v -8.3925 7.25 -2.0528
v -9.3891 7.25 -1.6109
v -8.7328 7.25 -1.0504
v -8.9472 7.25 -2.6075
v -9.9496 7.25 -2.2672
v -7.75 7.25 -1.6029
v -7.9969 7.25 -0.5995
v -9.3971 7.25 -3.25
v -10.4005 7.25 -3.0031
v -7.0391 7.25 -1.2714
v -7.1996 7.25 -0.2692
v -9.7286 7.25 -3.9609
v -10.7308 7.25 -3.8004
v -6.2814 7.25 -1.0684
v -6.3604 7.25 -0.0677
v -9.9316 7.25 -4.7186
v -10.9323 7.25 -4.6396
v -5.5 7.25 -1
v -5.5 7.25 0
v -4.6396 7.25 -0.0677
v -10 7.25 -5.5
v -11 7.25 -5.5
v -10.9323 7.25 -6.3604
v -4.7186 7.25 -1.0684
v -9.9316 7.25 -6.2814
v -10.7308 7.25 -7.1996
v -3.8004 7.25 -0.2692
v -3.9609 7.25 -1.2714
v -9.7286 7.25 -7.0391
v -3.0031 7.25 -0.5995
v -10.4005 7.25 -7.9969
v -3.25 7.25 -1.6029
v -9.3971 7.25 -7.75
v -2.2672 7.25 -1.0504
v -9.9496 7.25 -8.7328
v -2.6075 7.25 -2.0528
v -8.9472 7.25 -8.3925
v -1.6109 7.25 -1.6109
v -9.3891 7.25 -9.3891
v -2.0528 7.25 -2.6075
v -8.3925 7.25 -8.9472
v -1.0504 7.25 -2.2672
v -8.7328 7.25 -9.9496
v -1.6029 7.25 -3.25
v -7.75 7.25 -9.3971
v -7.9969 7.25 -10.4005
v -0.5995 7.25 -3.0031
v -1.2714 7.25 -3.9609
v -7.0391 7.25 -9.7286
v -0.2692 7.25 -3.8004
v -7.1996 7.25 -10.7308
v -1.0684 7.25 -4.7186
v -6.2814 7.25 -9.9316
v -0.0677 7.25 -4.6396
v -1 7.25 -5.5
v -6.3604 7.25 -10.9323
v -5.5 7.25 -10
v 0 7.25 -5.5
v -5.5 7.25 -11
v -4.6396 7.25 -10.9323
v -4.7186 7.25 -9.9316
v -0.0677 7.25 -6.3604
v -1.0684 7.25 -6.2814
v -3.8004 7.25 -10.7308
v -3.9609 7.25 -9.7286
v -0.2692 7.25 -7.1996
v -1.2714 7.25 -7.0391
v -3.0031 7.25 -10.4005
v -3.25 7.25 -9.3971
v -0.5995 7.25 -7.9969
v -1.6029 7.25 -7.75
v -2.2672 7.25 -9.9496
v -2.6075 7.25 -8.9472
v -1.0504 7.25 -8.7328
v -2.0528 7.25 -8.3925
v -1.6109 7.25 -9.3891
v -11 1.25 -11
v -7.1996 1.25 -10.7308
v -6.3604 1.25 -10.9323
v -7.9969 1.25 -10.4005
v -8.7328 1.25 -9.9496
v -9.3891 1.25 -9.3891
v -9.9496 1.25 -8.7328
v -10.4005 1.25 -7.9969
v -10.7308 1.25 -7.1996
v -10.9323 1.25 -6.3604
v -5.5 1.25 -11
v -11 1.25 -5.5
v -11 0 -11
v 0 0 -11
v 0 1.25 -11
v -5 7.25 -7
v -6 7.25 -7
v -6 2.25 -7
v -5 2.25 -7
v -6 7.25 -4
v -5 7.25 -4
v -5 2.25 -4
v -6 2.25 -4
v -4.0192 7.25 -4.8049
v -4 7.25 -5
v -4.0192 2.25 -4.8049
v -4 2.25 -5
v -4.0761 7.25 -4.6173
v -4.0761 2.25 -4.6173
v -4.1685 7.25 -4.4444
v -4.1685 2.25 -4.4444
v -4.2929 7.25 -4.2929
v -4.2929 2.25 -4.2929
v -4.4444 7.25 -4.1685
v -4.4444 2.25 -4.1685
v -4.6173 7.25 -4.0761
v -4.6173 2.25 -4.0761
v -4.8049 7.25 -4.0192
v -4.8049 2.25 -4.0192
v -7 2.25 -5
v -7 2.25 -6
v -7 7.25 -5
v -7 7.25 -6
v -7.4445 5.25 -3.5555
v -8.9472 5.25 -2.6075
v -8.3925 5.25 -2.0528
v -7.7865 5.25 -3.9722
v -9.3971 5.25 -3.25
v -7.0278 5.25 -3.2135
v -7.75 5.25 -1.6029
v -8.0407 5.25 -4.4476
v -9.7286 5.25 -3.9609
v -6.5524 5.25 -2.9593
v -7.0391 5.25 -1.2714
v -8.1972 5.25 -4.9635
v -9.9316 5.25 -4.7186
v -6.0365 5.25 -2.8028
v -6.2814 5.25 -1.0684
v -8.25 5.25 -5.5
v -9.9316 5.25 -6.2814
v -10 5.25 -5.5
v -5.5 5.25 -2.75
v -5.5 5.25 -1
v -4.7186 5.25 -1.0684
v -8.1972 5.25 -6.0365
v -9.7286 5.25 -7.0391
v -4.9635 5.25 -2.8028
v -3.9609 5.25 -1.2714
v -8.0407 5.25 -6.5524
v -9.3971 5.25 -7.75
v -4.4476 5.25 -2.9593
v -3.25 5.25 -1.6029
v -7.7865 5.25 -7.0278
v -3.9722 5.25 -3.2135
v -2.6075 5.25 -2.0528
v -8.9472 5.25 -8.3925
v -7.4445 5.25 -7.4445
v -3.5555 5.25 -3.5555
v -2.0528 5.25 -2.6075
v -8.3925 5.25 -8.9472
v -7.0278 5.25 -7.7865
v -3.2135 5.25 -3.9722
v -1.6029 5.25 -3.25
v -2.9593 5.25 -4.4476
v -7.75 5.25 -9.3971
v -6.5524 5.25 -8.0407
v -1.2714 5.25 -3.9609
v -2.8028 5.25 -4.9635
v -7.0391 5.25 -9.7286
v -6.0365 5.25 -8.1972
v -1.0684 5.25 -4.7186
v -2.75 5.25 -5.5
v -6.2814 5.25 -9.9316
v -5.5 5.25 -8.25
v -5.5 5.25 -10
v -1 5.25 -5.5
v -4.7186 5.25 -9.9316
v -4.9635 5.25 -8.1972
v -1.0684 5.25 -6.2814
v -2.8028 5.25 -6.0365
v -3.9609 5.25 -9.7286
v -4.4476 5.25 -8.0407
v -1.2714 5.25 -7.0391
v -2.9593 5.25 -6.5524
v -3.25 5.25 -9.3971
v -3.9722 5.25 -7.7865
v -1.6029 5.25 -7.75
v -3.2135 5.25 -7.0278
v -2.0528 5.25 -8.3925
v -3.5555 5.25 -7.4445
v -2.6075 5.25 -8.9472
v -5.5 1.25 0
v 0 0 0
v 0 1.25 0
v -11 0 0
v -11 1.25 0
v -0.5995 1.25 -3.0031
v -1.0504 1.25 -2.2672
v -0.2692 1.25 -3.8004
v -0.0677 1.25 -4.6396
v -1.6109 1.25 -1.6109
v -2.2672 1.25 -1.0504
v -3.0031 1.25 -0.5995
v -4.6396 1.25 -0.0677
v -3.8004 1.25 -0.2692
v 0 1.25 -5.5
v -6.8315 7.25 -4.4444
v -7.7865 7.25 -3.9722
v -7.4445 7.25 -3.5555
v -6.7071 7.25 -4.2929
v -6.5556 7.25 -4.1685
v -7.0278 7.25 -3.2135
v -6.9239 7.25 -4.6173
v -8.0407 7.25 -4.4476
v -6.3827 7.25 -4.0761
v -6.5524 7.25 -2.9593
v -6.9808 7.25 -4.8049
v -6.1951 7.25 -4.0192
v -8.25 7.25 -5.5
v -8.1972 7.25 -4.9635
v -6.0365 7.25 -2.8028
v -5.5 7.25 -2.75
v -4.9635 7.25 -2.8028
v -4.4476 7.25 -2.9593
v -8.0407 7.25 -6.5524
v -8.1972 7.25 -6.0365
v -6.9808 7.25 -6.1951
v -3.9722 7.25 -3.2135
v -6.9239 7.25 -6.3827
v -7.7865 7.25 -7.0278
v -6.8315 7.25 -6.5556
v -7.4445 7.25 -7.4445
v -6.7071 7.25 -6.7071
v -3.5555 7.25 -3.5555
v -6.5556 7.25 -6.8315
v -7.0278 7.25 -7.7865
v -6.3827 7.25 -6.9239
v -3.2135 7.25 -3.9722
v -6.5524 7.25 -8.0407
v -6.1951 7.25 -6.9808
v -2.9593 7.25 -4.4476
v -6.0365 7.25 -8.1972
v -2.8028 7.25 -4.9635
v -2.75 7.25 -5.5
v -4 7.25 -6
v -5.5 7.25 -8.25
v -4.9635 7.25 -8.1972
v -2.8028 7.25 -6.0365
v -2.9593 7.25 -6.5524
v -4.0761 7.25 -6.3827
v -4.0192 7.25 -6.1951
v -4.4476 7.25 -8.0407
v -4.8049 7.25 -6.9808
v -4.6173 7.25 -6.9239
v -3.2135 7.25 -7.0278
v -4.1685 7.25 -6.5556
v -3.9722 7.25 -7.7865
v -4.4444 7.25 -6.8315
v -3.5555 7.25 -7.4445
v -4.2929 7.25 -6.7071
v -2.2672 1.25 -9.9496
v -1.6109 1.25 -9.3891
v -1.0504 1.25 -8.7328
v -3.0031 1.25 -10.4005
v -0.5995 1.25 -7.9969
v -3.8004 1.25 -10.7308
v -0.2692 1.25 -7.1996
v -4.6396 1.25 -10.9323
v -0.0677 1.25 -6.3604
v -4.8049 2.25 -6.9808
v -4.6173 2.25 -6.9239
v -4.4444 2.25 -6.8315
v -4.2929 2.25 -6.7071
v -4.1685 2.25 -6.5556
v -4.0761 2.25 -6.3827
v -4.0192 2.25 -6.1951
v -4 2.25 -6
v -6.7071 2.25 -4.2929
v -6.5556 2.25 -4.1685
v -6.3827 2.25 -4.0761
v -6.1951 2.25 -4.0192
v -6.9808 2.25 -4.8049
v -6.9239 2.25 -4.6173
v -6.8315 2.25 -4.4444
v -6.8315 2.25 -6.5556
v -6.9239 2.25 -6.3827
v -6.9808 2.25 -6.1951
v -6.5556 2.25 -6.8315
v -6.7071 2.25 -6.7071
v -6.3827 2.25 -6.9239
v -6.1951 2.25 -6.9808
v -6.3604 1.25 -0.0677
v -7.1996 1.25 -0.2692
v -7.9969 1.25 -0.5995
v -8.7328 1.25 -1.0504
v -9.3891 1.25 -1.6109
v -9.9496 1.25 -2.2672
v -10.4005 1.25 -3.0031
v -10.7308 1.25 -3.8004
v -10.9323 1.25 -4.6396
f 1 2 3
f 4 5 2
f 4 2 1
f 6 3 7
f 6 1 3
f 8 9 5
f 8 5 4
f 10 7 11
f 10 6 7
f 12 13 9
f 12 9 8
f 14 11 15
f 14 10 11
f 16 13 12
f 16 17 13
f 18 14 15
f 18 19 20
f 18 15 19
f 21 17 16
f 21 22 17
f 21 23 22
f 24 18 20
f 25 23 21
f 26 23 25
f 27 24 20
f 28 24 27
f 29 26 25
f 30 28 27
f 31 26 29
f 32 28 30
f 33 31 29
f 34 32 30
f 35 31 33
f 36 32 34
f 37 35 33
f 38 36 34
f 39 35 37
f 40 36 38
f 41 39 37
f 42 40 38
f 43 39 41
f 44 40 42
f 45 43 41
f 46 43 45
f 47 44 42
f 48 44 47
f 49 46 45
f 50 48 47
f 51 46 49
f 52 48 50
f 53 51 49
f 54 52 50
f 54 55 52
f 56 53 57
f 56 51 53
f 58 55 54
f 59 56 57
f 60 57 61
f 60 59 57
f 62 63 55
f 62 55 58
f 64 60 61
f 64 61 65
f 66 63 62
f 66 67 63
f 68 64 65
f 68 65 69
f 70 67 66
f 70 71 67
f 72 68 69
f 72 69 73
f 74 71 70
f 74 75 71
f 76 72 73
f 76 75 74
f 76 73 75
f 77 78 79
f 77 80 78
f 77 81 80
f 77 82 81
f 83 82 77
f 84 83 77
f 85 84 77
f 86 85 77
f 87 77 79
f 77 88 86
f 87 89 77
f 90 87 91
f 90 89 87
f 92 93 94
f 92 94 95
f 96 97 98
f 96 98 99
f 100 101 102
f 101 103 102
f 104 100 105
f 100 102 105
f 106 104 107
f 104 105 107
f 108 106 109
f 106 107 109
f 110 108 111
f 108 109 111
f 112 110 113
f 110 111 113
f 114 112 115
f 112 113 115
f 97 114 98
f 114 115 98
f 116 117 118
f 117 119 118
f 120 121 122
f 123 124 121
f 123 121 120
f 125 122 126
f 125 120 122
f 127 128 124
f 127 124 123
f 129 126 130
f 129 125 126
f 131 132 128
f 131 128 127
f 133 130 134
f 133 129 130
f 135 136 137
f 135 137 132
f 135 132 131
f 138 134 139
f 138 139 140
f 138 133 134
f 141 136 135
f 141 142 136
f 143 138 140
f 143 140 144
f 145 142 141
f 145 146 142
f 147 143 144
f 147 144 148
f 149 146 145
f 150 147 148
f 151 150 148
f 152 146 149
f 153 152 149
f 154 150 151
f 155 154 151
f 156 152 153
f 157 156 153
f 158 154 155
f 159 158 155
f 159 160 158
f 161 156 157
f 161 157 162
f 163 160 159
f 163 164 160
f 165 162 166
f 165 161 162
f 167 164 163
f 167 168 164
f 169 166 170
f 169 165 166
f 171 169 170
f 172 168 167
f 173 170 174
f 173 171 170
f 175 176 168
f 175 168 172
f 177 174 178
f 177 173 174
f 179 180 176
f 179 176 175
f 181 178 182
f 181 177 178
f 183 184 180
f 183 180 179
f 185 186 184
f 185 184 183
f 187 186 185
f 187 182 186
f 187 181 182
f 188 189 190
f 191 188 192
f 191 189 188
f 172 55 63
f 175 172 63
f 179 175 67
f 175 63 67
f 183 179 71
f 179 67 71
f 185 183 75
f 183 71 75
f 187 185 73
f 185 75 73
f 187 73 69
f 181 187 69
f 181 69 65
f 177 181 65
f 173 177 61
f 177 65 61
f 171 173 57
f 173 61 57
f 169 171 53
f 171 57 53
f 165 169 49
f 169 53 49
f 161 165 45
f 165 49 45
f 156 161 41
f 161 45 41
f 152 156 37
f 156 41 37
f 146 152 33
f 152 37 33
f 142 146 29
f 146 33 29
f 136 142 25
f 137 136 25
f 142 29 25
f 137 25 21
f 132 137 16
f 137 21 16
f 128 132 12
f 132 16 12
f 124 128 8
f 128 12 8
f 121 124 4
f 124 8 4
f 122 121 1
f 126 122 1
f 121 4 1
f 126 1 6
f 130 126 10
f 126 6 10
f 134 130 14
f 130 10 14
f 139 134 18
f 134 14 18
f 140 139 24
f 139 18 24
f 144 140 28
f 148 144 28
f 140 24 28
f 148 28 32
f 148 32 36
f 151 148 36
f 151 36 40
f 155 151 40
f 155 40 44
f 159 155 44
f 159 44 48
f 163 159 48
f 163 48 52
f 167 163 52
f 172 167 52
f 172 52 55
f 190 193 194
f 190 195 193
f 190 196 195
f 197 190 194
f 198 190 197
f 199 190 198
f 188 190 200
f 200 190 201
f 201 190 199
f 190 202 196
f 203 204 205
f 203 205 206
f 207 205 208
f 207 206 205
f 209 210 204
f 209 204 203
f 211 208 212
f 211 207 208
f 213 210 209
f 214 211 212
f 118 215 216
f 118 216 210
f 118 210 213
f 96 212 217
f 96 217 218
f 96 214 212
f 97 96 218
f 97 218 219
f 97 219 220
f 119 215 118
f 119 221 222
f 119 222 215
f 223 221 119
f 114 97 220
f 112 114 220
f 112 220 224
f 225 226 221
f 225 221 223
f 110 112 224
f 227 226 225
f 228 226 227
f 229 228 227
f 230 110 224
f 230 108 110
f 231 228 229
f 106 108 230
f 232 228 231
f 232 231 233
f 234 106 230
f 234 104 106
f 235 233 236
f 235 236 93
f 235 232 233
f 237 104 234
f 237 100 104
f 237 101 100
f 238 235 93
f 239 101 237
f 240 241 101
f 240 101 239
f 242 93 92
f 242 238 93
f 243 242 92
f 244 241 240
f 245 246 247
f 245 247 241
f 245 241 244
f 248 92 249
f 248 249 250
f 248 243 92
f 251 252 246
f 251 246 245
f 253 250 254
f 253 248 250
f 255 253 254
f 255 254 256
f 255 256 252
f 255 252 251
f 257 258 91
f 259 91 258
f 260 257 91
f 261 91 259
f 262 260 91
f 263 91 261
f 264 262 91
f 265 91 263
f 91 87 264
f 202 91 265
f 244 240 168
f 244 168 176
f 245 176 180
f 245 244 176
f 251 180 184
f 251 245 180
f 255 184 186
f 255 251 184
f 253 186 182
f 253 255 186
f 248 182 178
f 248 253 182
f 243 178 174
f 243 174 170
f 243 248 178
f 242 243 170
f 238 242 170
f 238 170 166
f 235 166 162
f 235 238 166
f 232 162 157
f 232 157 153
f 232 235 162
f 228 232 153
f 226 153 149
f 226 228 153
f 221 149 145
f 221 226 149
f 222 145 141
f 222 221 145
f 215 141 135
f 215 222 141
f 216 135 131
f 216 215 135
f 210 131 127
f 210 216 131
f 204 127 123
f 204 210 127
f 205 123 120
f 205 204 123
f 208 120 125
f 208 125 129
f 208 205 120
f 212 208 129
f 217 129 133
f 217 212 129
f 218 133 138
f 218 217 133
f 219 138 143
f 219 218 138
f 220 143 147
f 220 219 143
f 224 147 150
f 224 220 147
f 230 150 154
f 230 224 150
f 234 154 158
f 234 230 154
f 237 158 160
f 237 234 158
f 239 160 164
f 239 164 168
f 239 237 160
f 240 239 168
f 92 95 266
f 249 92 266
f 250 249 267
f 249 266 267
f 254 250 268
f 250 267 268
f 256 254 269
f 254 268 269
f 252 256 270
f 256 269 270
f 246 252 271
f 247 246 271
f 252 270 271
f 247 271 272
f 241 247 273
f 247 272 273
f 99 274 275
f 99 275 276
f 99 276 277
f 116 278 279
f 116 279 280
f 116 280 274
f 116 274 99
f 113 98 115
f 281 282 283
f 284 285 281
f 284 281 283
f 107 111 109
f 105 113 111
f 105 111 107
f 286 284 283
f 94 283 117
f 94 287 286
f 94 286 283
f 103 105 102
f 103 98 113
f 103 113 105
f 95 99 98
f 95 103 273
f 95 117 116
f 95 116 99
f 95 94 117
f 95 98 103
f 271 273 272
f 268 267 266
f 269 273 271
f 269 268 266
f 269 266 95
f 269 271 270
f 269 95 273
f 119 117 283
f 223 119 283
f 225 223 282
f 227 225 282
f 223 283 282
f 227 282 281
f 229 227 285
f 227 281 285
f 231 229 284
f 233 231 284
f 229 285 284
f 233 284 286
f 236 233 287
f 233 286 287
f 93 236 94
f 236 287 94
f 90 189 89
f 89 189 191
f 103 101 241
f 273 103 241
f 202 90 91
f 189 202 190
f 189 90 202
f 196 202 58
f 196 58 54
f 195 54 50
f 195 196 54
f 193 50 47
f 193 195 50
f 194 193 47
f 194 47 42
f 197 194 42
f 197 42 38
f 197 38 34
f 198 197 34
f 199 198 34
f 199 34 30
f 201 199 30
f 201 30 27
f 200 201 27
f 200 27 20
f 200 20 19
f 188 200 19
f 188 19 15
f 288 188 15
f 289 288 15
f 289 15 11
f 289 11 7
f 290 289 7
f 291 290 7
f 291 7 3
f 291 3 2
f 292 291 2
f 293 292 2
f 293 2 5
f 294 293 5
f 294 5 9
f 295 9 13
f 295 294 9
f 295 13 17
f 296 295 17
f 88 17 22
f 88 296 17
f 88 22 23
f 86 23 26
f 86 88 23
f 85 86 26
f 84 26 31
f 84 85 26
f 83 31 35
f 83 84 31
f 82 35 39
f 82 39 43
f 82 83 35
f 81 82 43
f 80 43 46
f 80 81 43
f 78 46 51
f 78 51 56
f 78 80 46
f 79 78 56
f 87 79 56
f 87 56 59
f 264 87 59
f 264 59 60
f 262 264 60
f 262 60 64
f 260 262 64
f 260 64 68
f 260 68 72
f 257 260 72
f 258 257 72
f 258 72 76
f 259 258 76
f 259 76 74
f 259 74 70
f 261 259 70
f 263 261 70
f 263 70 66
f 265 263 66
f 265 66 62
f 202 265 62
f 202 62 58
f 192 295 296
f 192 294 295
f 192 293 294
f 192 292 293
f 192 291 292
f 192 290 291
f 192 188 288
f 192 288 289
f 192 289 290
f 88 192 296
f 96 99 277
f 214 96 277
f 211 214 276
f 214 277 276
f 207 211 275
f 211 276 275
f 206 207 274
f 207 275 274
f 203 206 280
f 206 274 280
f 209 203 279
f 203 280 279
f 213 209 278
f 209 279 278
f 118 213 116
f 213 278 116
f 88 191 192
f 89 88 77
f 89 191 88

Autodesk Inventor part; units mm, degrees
ref_plane "YZ Plane" through (0, 0, 0) normal (1, 0, 0) x (0, 1, 0)
ref_plane "XZ Plane" through (0, 0, 0) normal (0, 1, 0) x (-1, 0, 0)
ref_plane "XY Plane" through (0, 0, 0) normal (0, 0, 1) x (1, 0, 0)
sketch "Boceto1" plane through (0, 0, 0) normal (0, 1, 0) x (-1, 0, 0)
  line L0 (0, 0) -> (11, 0)
  line L1 (11, 0) -> (11, -11)
  line L2 (11, -11) -> (0, -11)
  line L3 (0, -11) -> (0, 0)
  dimension "d0" = 11
  dimension "d1" = 11
extrude "Extrusión1" add sketch "Boceto1" along normal blind 1.25
sketch "Boceto2" plane through (0, 1.25, 0) normal (0, 1, 0) x (1, 0, 0)
  line L0 (-11, 0) -> (0, 0) projected
  line L1 (-11, 11) -> (-11, 0) projected
  line L2 (0, 0) -> (-11, 11)
  line L3 (0, 0) -> (0, 11) projected
  line L4 (0, 11) -> (-11, 0)
  circle A0 centre (-5.5, 5.5) radius 5.5
  dimension "d4" = 11
extrude "Extrusión2" add sketch "Boceto2" along normal blind 6 contours A0 L4 L2 | A0 L2 L4 | L2 L4 A0 | A0 L4 L2
sketch "Boceto4" plane through (-5.5, 7.25, -5.5) normal (0, 1, 0) x (1, 0, 0)
  line L0 (0, 0) -> (-3, 0)
  line L1 (-3, 0) -> (-3, 1.5)
  line L2 (-3, 1.5) -> (-3, -1.5)
  line L3 (-3, -1.5) -> (-1.5, -1.5)
  line L4 (-1.5, -1.5) -> (-1.5, -3)
  line L5 (-1.5, -3) -> (1.5, -3)
  line L6 (1.5, -3) -> (1.5, -1.5)
  line L7 (1.5, -1.5) -> (3, -1.5)
  line L8 (3, -1.5) -> (3, 1.5)
  line L9 (3, 1.5) -> (1.5, 1.5)
  line L10 (1.5, 1.5) -> (1.5, 3)
  line L11 (1.5, 3) -> (-1.5, 3)
  line L12 (-1.5, 3) -> (-1.5, 1.5)
  line L13 (-3, 1.5) -> (-1.5, 1.5)
  line L14 (-1.5, 1.5) -> (-1.5, -1.5)
  line L15 (1.5, -1.5) -> (1.5, 1.5)
  line L16 (-1.5, 1.5) -> (1.5, 1.5)
  line L17 (1.5, -1.5) -> (-1.5, -1.5)
  point P0 (5.5, -5.5)
  dimension "d7" = 3
  dimension "d8" = 1.5
  dimension "d9" = 3
  dimension "d10" = 1.5
  dimension "d11" = 1.5
  dimension "d12" = 3
  dimension "d13" = 1.5
  dimension "d14" = 1.5
  dimension "d15" = 3
  dimension "d16" = 1.5
  dimension "d17" = 1.5
  dimension "d18" = 3
extrude "Extrusión3" cut sketch "Boceto4" against normal blind 5 contours L14 L16 L15 L17
sketch "Boceto8" plane through (-5.5, 7.25, -5.5) normal (0, 1, 0) x (1, 0, 0)
  circle A0 centre (0, 0) radius 2.75
  circle A1 centre (0, 0) radius 4.5
  point P0 (5.5, -5.5)
  dimension "d47" = 5.5
  dimension "d48" = 9
extrude "Extrusión6" cut sketch "Boceto8" against normal blind 2
fillet "Empalme4" radius 1 4 edges at (-7, 4.75, -7) (-4, 4.75, -7) (-4, 4.75, -4) (-7, 4.75, -4)
properties part number "Boton Base"
